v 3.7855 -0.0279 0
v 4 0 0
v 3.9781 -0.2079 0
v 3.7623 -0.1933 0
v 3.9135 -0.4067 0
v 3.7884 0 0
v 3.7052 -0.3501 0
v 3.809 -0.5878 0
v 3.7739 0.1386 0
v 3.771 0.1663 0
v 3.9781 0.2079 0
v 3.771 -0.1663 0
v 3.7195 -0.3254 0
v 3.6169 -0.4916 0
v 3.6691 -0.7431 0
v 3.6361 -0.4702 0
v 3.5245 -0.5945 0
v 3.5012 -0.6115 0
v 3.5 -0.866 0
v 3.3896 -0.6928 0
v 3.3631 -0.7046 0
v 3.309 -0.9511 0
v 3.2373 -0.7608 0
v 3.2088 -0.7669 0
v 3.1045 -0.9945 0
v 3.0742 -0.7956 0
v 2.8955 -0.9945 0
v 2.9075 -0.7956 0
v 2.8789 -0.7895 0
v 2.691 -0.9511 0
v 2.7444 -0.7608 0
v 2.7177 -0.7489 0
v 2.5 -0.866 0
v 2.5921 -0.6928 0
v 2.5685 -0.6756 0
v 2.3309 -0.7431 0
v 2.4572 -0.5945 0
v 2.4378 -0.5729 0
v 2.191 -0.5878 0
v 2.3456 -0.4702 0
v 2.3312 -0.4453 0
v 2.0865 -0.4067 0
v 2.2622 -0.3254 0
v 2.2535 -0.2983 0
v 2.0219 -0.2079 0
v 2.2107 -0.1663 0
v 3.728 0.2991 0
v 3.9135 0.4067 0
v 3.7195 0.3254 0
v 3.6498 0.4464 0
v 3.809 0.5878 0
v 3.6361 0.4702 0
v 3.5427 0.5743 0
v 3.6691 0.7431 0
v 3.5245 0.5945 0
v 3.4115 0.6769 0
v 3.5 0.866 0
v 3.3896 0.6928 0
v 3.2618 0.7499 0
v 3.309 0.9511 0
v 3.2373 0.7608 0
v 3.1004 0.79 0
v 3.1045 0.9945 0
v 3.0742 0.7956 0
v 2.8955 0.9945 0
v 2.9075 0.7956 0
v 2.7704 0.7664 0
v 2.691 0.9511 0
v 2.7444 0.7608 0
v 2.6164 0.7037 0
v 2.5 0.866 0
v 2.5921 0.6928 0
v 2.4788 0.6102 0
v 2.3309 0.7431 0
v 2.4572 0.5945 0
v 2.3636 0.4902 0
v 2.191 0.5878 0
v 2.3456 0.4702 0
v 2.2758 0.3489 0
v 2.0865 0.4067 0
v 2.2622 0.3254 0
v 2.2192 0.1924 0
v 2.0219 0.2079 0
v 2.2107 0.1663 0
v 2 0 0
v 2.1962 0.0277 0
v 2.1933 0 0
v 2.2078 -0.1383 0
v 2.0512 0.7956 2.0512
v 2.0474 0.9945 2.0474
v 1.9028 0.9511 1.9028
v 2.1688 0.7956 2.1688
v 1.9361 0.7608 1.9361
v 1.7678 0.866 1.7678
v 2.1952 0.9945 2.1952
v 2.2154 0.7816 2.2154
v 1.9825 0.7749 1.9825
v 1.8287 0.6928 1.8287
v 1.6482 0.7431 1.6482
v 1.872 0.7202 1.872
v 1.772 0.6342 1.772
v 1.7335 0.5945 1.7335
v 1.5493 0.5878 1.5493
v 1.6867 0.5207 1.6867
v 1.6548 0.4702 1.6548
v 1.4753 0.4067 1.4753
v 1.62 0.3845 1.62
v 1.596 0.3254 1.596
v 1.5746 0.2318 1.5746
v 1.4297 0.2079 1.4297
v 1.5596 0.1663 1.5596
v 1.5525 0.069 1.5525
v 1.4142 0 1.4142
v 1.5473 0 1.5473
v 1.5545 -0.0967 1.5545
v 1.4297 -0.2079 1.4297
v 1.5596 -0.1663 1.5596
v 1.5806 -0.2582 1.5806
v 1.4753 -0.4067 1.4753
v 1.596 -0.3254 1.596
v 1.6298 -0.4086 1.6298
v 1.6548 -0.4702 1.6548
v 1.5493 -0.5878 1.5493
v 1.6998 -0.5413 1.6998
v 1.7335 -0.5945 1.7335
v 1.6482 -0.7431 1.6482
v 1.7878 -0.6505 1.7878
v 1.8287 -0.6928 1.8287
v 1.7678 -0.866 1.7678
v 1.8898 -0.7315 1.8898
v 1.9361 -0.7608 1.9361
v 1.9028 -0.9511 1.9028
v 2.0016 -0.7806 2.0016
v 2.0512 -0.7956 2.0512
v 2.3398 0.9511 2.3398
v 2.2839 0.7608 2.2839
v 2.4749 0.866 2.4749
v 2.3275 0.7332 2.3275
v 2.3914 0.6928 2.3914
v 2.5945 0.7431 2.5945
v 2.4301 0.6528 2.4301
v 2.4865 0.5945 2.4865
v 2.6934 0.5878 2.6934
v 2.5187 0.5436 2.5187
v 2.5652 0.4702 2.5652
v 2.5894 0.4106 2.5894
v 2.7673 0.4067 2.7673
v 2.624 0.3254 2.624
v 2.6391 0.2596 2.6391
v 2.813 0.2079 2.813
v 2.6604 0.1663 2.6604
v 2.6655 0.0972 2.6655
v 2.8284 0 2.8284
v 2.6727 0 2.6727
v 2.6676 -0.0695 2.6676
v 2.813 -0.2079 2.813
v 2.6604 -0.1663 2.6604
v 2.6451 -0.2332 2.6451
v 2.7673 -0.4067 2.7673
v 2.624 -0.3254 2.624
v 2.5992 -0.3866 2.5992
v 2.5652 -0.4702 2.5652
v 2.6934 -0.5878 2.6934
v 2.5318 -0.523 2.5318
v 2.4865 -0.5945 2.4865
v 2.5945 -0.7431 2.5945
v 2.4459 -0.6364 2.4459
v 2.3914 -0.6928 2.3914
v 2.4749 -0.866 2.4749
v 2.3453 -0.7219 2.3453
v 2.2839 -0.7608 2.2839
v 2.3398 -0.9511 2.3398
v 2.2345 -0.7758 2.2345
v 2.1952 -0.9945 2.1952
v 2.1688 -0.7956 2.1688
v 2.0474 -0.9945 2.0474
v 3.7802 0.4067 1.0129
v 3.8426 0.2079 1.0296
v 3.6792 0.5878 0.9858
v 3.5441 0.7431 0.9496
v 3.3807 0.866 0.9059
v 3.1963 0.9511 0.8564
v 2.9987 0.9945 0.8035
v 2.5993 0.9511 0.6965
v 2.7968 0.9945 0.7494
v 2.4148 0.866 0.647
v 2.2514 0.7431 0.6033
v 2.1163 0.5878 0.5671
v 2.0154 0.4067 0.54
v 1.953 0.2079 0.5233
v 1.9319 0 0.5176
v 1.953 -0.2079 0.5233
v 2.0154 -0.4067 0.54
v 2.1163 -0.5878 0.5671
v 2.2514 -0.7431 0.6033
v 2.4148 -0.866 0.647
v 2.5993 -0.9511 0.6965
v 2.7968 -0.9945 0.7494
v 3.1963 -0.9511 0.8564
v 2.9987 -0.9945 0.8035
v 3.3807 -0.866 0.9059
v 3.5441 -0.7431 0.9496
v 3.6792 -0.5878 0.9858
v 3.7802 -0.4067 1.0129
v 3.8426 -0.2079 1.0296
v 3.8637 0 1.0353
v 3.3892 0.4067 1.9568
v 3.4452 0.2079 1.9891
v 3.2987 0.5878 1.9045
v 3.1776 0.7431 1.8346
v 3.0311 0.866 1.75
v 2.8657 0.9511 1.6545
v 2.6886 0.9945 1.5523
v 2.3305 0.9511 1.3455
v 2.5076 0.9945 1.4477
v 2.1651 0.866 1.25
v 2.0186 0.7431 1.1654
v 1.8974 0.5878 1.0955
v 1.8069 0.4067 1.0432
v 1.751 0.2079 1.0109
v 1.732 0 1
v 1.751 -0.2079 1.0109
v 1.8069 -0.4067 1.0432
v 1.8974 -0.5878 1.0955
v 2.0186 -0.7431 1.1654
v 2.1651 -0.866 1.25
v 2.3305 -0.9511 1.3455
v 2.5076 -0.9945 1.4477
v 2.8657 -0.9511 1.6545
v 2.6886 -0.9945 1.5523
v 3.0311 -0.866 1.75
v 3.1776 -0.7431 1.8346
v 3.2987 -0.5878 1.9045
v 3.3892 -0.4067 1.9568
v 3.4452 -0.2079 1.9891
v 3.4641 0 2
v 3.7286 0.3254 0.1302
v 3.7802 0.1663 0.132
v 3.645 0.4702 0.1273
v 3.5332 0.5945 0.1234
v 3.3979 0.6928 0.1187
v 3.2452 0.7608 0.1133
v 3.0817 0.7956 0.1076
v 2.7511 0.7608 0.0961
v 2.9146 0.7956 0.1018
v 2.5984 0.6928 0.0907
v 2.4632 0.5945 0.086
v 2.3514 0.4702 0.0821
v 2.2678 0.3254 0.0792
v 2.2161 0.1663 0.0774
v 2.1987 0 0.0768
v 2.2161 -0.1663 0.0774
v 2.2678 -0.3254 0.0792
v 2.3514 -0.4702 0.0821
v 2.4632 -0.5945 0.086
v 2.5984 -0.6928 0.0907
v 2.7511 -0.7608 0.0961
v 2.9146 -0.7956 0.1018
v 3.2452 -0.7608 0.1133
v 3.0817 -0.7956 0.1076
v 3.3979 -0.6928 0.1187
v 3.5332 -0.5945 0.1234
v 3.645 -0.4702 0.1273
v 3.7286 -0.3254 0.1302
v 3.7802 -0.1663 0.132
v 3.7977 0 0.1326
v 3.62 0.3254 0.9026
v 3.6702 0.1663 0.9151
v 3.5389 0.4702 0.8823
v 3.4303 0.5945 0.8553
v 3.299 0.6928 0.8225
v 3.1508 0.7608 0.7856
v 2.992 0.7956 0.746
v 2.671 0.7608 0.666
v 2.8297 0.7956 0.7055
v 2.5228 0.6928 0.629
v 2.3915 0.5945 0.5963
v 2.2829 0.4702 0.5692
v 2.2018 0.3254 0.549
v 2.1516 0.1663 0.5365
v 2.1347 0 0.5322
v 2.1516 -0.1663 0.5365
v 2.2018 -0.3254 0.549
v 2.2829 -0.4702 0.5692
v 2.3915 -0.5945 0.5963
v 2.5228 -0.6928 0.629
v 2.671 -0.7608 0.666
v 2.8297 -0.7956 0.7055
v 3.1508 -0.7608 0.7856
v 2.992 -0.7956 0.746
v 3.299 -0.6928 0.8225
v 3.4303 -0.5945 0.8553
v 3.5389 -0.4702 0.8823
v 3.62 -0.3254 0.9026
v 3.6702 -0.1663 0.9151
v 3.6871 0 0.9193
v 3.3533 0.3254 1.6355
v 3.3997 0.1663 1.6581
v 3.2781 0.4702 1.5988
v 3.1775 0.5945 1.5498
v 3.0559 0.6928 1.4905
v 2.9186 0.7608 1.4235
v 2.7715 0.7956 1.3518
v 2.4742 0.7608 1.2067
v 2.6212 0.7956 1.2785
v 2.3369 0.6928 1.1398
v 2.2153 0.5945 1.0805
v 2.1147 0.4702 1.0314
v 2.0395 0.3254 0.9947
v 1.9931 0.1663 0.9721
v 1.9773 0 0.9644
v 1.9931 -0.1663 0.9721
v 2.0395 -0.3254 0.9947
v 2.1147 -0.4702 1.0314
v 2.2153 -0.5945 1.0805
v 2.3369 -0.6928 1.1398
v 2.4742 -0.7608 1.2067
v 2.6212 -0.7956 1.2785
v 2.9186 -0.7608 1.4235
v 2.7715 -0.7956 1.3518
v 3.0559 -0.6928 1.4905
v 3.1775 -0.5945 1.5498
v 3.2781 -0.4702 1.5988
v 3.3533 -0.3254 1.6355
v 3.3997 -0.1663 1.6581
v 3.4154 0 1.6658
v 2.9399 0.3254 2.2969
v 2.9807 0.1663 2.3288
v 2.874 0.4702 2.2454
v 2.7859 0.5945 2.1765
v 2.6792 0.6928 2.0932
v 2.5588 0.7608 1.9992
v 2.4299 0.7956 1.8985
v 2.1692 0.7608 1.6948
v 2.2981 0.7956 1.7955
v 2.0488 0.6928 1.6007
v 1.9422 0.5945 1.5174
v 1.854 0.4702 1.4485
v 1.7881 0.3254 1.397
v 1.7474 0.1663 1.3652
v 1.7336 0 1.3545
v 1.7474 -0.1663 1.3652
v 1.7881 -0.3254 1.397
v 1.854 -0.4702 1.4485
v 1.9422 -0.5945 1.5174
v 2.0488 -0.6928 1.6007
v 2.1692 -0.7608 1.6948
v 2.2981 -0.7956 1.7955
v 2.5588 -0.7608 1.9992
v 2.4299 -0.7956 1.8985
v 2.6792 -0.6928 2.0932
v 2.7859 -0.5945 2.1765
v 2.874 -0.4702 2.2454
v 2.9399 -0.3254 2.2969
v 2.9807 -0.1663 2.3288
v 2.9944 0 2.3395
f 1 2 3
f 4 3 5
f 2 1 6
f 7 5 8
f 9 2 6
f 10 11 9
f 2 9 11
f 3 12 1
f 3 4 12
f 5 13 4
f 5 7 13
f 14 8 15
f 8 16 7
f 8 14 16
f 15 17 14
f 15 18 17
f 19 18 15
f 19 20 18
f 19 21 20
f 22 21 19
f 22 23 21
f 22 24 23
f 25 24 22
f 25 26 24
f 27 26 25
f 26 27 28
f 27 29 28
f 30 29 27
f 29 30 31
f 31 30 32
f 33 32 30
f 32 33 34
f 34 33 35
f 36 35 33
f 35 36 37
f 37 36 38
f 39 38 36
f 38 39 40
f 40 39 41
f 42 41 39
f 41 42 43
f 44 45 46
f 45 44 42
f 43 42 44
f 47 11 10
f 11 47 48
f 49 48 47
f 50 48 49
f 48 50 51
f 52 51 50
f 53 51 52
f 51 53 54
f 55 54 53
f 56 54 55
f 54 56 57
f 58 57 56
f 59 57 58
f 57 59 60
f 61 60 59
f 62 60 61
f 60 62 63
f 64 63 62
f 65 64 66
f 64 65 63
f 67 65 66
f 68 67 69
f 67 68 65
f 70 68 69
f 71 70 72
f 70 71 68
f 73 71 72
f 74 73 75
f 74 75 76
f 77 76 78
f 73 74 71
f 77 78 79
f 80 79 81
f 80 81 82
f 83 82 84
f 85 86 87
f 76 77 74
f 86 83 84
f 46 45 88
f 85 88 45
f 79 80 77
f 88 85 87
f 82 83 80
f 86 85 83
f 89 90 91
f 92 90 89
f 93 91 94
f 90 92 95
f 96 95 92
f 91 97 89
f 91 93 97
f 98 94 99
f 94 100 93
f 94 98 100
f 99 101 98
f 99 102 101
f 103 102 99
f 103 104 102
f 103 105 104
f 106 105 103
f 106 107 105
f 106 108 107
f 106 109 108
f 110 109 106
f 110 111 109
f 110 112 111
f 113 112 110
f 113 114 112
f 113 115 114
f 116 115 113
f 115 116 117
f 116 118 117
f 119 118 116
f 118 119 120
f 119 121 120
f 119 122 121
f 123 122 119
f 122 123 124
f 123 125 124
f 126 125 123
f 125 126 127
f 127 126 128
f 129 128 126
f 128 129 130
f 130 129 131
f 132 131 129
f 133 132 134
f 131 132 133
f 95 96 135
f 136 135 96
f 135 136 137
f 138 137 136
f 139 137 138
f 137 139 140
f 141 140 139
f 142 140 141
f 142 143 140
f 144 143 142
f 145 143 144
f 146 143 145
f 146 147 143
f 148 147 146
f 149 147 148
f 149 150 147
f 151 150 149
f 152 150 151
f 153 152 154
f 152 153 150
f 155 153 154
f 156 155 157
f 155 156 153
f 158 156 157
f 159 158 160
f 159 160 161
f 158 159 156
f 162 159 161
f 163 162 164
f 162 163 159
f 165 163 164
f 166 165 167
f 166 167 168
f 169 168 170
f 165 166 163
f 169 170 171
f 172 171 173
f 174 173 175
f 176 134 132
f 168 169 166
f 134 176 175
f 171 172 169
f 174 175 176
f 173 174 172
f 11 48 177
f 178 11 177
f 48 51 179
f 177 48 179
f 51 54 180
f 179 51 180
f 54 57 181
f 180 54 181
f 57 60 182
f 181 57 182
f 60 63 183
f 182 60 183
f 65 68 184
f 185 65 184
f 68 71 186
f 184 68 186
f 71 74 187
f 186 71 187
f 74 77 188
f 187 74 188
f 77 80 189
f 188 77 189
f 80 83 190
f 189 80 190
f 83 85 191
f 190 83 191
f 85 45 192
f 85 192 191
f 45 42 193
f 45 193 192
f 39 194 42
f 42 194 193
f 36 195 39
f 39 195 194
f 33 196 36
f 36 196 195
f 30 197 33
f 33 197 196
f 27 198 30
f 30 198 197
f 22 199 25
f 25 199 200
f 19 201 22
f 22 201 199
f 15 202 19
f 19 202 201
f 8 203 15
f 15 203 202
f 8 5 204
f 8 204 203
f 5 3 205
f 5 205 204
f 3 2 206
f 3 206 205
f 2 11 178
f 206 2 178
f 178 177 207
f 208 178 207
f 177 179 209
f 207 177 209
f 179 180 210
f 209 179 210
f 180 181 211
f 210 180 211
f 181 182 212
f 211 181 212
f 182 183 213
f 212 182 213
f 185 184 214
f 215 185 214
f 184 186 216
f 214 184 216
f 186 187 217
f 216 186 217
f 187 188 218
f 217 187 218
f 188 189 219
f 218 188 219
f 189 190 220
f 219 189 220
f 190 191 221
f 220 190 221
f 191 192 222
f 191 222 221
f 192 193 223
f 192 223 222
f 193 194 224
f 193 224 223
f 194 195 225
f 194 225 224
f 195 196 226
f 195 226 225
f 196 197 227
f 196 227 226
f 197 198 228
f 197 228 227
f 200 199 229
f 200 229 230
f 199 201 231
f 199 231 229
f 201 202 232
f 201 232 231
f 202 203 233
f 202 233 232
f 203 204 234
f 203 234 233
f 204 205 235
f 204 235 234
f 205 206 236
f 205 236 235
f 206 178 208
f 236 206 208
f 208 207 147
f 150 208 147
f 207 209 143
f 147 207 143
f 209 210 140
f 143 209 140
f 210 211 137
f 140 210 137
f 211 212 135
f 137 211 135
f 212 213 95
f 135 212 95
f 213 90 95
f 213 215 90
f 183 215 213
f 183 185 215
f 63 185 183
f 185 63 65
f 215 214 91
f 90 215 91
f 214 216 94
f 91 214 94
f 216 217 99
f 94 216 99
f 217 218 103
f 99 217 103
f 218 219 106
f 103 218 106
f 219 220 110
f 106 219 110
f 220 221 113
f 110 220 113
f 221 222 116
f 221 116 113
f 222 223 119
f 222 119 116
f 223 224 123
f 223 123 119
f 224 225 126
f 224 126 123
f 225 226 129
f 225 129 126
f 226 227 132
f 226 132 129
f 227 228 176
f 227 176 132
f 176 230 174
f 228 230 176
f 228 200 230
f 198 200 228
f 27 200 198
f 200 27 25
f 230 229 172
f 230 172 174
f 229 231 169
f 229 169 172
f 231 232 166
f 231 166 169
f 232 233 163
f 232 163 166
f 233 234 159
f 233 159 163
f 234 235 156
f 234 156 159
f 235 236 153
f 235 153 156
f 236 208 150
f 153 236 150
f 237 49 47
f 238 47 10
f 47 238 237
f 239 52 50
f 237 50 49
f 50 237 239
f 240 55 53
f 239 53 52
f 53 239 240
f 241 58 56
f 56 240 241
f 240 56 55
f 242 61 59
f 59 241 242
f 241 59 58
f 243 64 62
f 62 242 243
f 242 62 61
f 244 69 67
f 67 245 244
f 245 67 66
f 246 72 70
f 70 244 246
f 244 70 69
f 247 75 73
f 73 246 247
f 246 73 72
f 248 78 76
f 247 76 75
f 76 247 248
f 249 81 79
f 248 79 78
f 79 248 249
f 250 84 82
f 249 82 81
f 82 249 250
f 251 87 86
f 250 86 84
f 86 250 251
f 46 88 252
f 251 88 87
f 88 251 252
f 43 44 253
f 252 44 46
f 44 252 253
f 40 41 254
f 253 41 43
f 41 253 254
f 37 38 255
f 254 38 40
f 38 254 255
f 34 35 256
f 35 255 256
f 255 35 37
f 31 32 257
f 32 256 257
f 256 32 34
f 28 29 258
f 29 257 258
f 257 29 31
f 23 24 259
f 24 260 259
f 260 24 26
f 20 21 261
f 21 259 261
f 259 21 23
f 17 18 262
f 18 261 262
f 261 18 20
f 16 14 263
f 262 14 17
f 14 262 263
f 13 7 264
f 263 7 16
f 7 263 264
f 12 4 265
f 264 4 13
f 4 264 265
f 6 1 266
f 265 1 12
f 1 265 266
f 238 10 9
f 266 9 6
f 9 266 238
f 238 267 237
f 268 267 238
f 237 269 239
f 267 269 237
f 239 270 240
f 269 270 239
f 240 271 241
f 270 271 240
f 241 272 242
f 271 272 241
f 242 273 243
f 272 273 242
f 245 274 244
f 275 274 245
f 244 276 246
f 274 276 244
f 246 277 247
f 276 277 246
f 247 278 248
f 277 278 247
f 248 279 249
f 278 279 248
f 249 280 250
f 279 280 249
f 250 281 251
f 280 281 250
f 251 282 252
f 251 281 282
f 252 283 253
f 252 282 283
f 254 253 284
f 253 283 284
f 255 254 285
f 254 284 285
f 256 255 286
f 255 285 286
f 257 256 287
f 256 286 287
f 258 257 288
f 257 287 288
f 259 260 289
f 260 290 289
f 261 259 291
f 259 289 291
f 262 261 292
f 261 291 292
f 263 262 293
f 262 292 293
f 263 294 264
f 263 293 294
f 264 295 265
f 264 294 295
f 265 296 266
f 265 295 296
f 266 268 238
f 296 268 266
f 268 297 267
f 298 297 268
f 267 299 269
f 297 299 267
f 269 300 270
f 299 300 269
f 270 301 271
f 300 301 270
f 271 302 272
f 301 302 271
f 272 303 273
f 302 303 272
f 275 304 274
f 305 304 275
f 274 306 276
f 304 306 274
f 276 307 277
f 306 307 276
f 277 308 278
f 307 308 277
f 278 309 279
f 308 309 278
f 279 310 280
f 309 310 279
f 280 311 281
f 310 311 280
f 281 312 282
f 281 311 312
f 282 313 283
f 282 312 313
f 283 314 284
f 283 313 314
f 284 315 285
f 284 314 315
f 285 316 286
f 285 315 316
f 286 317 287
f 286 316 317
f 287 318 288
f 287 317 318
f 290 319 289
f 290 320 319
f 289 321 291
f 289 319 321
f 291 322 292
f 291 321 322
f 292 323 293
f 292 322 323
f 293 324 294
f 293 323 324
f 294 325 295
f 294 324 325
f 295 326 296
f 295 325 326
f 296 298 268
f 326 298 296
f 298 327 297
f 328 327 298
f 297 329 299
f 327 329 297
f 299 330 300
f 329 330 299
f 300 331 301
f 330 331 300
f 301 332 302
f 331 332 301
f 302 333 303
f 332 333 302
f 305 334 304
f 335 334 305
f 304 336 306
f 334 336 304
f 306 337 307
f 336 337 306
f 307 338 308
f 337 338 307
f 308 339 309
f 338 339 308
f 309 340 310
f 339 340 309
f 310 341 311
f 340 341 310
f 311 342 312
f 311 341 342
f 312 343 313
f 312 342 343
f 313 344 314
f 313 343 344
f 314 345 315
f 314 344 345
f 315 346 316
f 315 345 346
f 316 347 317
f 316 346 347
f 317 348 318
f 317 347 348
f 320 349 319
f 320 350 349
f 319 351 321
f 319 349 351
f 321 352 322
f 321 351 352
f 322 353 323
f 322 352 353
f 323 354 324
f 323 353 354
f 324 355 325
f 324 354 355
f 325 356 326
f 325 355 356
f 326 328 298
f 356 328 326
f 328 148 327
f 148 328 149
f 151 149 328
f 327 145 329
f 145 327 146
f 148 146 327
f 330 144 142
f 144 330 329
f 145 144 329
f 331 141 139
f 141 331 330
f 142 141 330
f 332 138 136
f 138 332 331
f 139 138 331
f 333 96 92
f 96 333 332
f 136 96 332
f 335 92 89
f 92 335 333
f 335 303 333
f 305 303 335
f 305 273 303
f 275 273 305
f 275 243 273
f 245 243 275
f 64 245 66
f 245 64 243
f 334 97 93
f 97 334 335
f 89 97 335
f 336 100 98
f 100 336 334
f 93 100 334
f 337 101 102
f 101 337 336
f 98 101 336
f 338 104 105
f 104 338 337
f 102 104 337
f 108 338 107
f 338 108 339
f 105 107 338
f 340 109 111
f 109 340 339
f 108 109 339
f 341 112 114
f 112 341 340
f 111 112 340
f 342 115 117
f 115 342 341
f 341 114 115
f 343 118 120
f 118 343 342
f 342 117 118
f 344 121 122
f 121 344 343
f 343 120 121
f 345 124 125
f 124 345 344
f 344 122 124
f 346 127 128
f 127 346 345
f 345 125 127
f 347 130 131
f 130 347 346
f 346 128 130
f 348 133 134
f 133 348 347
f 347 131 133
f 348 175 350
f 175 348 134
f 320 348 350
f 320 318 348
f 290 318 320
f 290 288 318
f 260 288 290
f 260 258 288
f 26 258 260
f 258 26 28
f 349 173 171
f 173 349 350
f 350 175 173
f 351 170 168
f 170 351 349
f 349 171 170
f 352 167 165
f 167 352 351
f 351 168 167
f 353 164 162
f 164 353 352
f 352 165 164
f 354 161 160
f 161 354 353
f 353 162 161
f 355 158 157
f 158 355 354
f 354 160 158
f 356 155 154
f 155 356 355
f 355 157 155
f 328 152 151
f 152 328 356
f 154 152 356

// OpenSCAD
// Nicolì Angelo 2023 - THIS CODE IS LICENSED AS GPL-2.0

module pipe(raggio,angolo){
color("#a8b0b2")
rotate([90,0,0])
rotate_extrude(angle=angolo, $fn = $preview? 90: 30) 
translate([3, 0, 0])
circle(r = raggio, $fn = $preview? 90: 30);
}

difference(){
   translate([0,0])
   pipe(1,45);
   
   rotate([0,10,0])
   translate([0,0])
   pipe(0.8,60);
 }


module repeat(){
difference(){
 for (i =[-1:1]){
     translate([0,5*i,0])
     ring(1,90);
 }

 for (i =[-1:1]){
    rotate([0,10,0])
     translate([0,5*i,0])
     ring(0.8,110);
 }
 
}
}
